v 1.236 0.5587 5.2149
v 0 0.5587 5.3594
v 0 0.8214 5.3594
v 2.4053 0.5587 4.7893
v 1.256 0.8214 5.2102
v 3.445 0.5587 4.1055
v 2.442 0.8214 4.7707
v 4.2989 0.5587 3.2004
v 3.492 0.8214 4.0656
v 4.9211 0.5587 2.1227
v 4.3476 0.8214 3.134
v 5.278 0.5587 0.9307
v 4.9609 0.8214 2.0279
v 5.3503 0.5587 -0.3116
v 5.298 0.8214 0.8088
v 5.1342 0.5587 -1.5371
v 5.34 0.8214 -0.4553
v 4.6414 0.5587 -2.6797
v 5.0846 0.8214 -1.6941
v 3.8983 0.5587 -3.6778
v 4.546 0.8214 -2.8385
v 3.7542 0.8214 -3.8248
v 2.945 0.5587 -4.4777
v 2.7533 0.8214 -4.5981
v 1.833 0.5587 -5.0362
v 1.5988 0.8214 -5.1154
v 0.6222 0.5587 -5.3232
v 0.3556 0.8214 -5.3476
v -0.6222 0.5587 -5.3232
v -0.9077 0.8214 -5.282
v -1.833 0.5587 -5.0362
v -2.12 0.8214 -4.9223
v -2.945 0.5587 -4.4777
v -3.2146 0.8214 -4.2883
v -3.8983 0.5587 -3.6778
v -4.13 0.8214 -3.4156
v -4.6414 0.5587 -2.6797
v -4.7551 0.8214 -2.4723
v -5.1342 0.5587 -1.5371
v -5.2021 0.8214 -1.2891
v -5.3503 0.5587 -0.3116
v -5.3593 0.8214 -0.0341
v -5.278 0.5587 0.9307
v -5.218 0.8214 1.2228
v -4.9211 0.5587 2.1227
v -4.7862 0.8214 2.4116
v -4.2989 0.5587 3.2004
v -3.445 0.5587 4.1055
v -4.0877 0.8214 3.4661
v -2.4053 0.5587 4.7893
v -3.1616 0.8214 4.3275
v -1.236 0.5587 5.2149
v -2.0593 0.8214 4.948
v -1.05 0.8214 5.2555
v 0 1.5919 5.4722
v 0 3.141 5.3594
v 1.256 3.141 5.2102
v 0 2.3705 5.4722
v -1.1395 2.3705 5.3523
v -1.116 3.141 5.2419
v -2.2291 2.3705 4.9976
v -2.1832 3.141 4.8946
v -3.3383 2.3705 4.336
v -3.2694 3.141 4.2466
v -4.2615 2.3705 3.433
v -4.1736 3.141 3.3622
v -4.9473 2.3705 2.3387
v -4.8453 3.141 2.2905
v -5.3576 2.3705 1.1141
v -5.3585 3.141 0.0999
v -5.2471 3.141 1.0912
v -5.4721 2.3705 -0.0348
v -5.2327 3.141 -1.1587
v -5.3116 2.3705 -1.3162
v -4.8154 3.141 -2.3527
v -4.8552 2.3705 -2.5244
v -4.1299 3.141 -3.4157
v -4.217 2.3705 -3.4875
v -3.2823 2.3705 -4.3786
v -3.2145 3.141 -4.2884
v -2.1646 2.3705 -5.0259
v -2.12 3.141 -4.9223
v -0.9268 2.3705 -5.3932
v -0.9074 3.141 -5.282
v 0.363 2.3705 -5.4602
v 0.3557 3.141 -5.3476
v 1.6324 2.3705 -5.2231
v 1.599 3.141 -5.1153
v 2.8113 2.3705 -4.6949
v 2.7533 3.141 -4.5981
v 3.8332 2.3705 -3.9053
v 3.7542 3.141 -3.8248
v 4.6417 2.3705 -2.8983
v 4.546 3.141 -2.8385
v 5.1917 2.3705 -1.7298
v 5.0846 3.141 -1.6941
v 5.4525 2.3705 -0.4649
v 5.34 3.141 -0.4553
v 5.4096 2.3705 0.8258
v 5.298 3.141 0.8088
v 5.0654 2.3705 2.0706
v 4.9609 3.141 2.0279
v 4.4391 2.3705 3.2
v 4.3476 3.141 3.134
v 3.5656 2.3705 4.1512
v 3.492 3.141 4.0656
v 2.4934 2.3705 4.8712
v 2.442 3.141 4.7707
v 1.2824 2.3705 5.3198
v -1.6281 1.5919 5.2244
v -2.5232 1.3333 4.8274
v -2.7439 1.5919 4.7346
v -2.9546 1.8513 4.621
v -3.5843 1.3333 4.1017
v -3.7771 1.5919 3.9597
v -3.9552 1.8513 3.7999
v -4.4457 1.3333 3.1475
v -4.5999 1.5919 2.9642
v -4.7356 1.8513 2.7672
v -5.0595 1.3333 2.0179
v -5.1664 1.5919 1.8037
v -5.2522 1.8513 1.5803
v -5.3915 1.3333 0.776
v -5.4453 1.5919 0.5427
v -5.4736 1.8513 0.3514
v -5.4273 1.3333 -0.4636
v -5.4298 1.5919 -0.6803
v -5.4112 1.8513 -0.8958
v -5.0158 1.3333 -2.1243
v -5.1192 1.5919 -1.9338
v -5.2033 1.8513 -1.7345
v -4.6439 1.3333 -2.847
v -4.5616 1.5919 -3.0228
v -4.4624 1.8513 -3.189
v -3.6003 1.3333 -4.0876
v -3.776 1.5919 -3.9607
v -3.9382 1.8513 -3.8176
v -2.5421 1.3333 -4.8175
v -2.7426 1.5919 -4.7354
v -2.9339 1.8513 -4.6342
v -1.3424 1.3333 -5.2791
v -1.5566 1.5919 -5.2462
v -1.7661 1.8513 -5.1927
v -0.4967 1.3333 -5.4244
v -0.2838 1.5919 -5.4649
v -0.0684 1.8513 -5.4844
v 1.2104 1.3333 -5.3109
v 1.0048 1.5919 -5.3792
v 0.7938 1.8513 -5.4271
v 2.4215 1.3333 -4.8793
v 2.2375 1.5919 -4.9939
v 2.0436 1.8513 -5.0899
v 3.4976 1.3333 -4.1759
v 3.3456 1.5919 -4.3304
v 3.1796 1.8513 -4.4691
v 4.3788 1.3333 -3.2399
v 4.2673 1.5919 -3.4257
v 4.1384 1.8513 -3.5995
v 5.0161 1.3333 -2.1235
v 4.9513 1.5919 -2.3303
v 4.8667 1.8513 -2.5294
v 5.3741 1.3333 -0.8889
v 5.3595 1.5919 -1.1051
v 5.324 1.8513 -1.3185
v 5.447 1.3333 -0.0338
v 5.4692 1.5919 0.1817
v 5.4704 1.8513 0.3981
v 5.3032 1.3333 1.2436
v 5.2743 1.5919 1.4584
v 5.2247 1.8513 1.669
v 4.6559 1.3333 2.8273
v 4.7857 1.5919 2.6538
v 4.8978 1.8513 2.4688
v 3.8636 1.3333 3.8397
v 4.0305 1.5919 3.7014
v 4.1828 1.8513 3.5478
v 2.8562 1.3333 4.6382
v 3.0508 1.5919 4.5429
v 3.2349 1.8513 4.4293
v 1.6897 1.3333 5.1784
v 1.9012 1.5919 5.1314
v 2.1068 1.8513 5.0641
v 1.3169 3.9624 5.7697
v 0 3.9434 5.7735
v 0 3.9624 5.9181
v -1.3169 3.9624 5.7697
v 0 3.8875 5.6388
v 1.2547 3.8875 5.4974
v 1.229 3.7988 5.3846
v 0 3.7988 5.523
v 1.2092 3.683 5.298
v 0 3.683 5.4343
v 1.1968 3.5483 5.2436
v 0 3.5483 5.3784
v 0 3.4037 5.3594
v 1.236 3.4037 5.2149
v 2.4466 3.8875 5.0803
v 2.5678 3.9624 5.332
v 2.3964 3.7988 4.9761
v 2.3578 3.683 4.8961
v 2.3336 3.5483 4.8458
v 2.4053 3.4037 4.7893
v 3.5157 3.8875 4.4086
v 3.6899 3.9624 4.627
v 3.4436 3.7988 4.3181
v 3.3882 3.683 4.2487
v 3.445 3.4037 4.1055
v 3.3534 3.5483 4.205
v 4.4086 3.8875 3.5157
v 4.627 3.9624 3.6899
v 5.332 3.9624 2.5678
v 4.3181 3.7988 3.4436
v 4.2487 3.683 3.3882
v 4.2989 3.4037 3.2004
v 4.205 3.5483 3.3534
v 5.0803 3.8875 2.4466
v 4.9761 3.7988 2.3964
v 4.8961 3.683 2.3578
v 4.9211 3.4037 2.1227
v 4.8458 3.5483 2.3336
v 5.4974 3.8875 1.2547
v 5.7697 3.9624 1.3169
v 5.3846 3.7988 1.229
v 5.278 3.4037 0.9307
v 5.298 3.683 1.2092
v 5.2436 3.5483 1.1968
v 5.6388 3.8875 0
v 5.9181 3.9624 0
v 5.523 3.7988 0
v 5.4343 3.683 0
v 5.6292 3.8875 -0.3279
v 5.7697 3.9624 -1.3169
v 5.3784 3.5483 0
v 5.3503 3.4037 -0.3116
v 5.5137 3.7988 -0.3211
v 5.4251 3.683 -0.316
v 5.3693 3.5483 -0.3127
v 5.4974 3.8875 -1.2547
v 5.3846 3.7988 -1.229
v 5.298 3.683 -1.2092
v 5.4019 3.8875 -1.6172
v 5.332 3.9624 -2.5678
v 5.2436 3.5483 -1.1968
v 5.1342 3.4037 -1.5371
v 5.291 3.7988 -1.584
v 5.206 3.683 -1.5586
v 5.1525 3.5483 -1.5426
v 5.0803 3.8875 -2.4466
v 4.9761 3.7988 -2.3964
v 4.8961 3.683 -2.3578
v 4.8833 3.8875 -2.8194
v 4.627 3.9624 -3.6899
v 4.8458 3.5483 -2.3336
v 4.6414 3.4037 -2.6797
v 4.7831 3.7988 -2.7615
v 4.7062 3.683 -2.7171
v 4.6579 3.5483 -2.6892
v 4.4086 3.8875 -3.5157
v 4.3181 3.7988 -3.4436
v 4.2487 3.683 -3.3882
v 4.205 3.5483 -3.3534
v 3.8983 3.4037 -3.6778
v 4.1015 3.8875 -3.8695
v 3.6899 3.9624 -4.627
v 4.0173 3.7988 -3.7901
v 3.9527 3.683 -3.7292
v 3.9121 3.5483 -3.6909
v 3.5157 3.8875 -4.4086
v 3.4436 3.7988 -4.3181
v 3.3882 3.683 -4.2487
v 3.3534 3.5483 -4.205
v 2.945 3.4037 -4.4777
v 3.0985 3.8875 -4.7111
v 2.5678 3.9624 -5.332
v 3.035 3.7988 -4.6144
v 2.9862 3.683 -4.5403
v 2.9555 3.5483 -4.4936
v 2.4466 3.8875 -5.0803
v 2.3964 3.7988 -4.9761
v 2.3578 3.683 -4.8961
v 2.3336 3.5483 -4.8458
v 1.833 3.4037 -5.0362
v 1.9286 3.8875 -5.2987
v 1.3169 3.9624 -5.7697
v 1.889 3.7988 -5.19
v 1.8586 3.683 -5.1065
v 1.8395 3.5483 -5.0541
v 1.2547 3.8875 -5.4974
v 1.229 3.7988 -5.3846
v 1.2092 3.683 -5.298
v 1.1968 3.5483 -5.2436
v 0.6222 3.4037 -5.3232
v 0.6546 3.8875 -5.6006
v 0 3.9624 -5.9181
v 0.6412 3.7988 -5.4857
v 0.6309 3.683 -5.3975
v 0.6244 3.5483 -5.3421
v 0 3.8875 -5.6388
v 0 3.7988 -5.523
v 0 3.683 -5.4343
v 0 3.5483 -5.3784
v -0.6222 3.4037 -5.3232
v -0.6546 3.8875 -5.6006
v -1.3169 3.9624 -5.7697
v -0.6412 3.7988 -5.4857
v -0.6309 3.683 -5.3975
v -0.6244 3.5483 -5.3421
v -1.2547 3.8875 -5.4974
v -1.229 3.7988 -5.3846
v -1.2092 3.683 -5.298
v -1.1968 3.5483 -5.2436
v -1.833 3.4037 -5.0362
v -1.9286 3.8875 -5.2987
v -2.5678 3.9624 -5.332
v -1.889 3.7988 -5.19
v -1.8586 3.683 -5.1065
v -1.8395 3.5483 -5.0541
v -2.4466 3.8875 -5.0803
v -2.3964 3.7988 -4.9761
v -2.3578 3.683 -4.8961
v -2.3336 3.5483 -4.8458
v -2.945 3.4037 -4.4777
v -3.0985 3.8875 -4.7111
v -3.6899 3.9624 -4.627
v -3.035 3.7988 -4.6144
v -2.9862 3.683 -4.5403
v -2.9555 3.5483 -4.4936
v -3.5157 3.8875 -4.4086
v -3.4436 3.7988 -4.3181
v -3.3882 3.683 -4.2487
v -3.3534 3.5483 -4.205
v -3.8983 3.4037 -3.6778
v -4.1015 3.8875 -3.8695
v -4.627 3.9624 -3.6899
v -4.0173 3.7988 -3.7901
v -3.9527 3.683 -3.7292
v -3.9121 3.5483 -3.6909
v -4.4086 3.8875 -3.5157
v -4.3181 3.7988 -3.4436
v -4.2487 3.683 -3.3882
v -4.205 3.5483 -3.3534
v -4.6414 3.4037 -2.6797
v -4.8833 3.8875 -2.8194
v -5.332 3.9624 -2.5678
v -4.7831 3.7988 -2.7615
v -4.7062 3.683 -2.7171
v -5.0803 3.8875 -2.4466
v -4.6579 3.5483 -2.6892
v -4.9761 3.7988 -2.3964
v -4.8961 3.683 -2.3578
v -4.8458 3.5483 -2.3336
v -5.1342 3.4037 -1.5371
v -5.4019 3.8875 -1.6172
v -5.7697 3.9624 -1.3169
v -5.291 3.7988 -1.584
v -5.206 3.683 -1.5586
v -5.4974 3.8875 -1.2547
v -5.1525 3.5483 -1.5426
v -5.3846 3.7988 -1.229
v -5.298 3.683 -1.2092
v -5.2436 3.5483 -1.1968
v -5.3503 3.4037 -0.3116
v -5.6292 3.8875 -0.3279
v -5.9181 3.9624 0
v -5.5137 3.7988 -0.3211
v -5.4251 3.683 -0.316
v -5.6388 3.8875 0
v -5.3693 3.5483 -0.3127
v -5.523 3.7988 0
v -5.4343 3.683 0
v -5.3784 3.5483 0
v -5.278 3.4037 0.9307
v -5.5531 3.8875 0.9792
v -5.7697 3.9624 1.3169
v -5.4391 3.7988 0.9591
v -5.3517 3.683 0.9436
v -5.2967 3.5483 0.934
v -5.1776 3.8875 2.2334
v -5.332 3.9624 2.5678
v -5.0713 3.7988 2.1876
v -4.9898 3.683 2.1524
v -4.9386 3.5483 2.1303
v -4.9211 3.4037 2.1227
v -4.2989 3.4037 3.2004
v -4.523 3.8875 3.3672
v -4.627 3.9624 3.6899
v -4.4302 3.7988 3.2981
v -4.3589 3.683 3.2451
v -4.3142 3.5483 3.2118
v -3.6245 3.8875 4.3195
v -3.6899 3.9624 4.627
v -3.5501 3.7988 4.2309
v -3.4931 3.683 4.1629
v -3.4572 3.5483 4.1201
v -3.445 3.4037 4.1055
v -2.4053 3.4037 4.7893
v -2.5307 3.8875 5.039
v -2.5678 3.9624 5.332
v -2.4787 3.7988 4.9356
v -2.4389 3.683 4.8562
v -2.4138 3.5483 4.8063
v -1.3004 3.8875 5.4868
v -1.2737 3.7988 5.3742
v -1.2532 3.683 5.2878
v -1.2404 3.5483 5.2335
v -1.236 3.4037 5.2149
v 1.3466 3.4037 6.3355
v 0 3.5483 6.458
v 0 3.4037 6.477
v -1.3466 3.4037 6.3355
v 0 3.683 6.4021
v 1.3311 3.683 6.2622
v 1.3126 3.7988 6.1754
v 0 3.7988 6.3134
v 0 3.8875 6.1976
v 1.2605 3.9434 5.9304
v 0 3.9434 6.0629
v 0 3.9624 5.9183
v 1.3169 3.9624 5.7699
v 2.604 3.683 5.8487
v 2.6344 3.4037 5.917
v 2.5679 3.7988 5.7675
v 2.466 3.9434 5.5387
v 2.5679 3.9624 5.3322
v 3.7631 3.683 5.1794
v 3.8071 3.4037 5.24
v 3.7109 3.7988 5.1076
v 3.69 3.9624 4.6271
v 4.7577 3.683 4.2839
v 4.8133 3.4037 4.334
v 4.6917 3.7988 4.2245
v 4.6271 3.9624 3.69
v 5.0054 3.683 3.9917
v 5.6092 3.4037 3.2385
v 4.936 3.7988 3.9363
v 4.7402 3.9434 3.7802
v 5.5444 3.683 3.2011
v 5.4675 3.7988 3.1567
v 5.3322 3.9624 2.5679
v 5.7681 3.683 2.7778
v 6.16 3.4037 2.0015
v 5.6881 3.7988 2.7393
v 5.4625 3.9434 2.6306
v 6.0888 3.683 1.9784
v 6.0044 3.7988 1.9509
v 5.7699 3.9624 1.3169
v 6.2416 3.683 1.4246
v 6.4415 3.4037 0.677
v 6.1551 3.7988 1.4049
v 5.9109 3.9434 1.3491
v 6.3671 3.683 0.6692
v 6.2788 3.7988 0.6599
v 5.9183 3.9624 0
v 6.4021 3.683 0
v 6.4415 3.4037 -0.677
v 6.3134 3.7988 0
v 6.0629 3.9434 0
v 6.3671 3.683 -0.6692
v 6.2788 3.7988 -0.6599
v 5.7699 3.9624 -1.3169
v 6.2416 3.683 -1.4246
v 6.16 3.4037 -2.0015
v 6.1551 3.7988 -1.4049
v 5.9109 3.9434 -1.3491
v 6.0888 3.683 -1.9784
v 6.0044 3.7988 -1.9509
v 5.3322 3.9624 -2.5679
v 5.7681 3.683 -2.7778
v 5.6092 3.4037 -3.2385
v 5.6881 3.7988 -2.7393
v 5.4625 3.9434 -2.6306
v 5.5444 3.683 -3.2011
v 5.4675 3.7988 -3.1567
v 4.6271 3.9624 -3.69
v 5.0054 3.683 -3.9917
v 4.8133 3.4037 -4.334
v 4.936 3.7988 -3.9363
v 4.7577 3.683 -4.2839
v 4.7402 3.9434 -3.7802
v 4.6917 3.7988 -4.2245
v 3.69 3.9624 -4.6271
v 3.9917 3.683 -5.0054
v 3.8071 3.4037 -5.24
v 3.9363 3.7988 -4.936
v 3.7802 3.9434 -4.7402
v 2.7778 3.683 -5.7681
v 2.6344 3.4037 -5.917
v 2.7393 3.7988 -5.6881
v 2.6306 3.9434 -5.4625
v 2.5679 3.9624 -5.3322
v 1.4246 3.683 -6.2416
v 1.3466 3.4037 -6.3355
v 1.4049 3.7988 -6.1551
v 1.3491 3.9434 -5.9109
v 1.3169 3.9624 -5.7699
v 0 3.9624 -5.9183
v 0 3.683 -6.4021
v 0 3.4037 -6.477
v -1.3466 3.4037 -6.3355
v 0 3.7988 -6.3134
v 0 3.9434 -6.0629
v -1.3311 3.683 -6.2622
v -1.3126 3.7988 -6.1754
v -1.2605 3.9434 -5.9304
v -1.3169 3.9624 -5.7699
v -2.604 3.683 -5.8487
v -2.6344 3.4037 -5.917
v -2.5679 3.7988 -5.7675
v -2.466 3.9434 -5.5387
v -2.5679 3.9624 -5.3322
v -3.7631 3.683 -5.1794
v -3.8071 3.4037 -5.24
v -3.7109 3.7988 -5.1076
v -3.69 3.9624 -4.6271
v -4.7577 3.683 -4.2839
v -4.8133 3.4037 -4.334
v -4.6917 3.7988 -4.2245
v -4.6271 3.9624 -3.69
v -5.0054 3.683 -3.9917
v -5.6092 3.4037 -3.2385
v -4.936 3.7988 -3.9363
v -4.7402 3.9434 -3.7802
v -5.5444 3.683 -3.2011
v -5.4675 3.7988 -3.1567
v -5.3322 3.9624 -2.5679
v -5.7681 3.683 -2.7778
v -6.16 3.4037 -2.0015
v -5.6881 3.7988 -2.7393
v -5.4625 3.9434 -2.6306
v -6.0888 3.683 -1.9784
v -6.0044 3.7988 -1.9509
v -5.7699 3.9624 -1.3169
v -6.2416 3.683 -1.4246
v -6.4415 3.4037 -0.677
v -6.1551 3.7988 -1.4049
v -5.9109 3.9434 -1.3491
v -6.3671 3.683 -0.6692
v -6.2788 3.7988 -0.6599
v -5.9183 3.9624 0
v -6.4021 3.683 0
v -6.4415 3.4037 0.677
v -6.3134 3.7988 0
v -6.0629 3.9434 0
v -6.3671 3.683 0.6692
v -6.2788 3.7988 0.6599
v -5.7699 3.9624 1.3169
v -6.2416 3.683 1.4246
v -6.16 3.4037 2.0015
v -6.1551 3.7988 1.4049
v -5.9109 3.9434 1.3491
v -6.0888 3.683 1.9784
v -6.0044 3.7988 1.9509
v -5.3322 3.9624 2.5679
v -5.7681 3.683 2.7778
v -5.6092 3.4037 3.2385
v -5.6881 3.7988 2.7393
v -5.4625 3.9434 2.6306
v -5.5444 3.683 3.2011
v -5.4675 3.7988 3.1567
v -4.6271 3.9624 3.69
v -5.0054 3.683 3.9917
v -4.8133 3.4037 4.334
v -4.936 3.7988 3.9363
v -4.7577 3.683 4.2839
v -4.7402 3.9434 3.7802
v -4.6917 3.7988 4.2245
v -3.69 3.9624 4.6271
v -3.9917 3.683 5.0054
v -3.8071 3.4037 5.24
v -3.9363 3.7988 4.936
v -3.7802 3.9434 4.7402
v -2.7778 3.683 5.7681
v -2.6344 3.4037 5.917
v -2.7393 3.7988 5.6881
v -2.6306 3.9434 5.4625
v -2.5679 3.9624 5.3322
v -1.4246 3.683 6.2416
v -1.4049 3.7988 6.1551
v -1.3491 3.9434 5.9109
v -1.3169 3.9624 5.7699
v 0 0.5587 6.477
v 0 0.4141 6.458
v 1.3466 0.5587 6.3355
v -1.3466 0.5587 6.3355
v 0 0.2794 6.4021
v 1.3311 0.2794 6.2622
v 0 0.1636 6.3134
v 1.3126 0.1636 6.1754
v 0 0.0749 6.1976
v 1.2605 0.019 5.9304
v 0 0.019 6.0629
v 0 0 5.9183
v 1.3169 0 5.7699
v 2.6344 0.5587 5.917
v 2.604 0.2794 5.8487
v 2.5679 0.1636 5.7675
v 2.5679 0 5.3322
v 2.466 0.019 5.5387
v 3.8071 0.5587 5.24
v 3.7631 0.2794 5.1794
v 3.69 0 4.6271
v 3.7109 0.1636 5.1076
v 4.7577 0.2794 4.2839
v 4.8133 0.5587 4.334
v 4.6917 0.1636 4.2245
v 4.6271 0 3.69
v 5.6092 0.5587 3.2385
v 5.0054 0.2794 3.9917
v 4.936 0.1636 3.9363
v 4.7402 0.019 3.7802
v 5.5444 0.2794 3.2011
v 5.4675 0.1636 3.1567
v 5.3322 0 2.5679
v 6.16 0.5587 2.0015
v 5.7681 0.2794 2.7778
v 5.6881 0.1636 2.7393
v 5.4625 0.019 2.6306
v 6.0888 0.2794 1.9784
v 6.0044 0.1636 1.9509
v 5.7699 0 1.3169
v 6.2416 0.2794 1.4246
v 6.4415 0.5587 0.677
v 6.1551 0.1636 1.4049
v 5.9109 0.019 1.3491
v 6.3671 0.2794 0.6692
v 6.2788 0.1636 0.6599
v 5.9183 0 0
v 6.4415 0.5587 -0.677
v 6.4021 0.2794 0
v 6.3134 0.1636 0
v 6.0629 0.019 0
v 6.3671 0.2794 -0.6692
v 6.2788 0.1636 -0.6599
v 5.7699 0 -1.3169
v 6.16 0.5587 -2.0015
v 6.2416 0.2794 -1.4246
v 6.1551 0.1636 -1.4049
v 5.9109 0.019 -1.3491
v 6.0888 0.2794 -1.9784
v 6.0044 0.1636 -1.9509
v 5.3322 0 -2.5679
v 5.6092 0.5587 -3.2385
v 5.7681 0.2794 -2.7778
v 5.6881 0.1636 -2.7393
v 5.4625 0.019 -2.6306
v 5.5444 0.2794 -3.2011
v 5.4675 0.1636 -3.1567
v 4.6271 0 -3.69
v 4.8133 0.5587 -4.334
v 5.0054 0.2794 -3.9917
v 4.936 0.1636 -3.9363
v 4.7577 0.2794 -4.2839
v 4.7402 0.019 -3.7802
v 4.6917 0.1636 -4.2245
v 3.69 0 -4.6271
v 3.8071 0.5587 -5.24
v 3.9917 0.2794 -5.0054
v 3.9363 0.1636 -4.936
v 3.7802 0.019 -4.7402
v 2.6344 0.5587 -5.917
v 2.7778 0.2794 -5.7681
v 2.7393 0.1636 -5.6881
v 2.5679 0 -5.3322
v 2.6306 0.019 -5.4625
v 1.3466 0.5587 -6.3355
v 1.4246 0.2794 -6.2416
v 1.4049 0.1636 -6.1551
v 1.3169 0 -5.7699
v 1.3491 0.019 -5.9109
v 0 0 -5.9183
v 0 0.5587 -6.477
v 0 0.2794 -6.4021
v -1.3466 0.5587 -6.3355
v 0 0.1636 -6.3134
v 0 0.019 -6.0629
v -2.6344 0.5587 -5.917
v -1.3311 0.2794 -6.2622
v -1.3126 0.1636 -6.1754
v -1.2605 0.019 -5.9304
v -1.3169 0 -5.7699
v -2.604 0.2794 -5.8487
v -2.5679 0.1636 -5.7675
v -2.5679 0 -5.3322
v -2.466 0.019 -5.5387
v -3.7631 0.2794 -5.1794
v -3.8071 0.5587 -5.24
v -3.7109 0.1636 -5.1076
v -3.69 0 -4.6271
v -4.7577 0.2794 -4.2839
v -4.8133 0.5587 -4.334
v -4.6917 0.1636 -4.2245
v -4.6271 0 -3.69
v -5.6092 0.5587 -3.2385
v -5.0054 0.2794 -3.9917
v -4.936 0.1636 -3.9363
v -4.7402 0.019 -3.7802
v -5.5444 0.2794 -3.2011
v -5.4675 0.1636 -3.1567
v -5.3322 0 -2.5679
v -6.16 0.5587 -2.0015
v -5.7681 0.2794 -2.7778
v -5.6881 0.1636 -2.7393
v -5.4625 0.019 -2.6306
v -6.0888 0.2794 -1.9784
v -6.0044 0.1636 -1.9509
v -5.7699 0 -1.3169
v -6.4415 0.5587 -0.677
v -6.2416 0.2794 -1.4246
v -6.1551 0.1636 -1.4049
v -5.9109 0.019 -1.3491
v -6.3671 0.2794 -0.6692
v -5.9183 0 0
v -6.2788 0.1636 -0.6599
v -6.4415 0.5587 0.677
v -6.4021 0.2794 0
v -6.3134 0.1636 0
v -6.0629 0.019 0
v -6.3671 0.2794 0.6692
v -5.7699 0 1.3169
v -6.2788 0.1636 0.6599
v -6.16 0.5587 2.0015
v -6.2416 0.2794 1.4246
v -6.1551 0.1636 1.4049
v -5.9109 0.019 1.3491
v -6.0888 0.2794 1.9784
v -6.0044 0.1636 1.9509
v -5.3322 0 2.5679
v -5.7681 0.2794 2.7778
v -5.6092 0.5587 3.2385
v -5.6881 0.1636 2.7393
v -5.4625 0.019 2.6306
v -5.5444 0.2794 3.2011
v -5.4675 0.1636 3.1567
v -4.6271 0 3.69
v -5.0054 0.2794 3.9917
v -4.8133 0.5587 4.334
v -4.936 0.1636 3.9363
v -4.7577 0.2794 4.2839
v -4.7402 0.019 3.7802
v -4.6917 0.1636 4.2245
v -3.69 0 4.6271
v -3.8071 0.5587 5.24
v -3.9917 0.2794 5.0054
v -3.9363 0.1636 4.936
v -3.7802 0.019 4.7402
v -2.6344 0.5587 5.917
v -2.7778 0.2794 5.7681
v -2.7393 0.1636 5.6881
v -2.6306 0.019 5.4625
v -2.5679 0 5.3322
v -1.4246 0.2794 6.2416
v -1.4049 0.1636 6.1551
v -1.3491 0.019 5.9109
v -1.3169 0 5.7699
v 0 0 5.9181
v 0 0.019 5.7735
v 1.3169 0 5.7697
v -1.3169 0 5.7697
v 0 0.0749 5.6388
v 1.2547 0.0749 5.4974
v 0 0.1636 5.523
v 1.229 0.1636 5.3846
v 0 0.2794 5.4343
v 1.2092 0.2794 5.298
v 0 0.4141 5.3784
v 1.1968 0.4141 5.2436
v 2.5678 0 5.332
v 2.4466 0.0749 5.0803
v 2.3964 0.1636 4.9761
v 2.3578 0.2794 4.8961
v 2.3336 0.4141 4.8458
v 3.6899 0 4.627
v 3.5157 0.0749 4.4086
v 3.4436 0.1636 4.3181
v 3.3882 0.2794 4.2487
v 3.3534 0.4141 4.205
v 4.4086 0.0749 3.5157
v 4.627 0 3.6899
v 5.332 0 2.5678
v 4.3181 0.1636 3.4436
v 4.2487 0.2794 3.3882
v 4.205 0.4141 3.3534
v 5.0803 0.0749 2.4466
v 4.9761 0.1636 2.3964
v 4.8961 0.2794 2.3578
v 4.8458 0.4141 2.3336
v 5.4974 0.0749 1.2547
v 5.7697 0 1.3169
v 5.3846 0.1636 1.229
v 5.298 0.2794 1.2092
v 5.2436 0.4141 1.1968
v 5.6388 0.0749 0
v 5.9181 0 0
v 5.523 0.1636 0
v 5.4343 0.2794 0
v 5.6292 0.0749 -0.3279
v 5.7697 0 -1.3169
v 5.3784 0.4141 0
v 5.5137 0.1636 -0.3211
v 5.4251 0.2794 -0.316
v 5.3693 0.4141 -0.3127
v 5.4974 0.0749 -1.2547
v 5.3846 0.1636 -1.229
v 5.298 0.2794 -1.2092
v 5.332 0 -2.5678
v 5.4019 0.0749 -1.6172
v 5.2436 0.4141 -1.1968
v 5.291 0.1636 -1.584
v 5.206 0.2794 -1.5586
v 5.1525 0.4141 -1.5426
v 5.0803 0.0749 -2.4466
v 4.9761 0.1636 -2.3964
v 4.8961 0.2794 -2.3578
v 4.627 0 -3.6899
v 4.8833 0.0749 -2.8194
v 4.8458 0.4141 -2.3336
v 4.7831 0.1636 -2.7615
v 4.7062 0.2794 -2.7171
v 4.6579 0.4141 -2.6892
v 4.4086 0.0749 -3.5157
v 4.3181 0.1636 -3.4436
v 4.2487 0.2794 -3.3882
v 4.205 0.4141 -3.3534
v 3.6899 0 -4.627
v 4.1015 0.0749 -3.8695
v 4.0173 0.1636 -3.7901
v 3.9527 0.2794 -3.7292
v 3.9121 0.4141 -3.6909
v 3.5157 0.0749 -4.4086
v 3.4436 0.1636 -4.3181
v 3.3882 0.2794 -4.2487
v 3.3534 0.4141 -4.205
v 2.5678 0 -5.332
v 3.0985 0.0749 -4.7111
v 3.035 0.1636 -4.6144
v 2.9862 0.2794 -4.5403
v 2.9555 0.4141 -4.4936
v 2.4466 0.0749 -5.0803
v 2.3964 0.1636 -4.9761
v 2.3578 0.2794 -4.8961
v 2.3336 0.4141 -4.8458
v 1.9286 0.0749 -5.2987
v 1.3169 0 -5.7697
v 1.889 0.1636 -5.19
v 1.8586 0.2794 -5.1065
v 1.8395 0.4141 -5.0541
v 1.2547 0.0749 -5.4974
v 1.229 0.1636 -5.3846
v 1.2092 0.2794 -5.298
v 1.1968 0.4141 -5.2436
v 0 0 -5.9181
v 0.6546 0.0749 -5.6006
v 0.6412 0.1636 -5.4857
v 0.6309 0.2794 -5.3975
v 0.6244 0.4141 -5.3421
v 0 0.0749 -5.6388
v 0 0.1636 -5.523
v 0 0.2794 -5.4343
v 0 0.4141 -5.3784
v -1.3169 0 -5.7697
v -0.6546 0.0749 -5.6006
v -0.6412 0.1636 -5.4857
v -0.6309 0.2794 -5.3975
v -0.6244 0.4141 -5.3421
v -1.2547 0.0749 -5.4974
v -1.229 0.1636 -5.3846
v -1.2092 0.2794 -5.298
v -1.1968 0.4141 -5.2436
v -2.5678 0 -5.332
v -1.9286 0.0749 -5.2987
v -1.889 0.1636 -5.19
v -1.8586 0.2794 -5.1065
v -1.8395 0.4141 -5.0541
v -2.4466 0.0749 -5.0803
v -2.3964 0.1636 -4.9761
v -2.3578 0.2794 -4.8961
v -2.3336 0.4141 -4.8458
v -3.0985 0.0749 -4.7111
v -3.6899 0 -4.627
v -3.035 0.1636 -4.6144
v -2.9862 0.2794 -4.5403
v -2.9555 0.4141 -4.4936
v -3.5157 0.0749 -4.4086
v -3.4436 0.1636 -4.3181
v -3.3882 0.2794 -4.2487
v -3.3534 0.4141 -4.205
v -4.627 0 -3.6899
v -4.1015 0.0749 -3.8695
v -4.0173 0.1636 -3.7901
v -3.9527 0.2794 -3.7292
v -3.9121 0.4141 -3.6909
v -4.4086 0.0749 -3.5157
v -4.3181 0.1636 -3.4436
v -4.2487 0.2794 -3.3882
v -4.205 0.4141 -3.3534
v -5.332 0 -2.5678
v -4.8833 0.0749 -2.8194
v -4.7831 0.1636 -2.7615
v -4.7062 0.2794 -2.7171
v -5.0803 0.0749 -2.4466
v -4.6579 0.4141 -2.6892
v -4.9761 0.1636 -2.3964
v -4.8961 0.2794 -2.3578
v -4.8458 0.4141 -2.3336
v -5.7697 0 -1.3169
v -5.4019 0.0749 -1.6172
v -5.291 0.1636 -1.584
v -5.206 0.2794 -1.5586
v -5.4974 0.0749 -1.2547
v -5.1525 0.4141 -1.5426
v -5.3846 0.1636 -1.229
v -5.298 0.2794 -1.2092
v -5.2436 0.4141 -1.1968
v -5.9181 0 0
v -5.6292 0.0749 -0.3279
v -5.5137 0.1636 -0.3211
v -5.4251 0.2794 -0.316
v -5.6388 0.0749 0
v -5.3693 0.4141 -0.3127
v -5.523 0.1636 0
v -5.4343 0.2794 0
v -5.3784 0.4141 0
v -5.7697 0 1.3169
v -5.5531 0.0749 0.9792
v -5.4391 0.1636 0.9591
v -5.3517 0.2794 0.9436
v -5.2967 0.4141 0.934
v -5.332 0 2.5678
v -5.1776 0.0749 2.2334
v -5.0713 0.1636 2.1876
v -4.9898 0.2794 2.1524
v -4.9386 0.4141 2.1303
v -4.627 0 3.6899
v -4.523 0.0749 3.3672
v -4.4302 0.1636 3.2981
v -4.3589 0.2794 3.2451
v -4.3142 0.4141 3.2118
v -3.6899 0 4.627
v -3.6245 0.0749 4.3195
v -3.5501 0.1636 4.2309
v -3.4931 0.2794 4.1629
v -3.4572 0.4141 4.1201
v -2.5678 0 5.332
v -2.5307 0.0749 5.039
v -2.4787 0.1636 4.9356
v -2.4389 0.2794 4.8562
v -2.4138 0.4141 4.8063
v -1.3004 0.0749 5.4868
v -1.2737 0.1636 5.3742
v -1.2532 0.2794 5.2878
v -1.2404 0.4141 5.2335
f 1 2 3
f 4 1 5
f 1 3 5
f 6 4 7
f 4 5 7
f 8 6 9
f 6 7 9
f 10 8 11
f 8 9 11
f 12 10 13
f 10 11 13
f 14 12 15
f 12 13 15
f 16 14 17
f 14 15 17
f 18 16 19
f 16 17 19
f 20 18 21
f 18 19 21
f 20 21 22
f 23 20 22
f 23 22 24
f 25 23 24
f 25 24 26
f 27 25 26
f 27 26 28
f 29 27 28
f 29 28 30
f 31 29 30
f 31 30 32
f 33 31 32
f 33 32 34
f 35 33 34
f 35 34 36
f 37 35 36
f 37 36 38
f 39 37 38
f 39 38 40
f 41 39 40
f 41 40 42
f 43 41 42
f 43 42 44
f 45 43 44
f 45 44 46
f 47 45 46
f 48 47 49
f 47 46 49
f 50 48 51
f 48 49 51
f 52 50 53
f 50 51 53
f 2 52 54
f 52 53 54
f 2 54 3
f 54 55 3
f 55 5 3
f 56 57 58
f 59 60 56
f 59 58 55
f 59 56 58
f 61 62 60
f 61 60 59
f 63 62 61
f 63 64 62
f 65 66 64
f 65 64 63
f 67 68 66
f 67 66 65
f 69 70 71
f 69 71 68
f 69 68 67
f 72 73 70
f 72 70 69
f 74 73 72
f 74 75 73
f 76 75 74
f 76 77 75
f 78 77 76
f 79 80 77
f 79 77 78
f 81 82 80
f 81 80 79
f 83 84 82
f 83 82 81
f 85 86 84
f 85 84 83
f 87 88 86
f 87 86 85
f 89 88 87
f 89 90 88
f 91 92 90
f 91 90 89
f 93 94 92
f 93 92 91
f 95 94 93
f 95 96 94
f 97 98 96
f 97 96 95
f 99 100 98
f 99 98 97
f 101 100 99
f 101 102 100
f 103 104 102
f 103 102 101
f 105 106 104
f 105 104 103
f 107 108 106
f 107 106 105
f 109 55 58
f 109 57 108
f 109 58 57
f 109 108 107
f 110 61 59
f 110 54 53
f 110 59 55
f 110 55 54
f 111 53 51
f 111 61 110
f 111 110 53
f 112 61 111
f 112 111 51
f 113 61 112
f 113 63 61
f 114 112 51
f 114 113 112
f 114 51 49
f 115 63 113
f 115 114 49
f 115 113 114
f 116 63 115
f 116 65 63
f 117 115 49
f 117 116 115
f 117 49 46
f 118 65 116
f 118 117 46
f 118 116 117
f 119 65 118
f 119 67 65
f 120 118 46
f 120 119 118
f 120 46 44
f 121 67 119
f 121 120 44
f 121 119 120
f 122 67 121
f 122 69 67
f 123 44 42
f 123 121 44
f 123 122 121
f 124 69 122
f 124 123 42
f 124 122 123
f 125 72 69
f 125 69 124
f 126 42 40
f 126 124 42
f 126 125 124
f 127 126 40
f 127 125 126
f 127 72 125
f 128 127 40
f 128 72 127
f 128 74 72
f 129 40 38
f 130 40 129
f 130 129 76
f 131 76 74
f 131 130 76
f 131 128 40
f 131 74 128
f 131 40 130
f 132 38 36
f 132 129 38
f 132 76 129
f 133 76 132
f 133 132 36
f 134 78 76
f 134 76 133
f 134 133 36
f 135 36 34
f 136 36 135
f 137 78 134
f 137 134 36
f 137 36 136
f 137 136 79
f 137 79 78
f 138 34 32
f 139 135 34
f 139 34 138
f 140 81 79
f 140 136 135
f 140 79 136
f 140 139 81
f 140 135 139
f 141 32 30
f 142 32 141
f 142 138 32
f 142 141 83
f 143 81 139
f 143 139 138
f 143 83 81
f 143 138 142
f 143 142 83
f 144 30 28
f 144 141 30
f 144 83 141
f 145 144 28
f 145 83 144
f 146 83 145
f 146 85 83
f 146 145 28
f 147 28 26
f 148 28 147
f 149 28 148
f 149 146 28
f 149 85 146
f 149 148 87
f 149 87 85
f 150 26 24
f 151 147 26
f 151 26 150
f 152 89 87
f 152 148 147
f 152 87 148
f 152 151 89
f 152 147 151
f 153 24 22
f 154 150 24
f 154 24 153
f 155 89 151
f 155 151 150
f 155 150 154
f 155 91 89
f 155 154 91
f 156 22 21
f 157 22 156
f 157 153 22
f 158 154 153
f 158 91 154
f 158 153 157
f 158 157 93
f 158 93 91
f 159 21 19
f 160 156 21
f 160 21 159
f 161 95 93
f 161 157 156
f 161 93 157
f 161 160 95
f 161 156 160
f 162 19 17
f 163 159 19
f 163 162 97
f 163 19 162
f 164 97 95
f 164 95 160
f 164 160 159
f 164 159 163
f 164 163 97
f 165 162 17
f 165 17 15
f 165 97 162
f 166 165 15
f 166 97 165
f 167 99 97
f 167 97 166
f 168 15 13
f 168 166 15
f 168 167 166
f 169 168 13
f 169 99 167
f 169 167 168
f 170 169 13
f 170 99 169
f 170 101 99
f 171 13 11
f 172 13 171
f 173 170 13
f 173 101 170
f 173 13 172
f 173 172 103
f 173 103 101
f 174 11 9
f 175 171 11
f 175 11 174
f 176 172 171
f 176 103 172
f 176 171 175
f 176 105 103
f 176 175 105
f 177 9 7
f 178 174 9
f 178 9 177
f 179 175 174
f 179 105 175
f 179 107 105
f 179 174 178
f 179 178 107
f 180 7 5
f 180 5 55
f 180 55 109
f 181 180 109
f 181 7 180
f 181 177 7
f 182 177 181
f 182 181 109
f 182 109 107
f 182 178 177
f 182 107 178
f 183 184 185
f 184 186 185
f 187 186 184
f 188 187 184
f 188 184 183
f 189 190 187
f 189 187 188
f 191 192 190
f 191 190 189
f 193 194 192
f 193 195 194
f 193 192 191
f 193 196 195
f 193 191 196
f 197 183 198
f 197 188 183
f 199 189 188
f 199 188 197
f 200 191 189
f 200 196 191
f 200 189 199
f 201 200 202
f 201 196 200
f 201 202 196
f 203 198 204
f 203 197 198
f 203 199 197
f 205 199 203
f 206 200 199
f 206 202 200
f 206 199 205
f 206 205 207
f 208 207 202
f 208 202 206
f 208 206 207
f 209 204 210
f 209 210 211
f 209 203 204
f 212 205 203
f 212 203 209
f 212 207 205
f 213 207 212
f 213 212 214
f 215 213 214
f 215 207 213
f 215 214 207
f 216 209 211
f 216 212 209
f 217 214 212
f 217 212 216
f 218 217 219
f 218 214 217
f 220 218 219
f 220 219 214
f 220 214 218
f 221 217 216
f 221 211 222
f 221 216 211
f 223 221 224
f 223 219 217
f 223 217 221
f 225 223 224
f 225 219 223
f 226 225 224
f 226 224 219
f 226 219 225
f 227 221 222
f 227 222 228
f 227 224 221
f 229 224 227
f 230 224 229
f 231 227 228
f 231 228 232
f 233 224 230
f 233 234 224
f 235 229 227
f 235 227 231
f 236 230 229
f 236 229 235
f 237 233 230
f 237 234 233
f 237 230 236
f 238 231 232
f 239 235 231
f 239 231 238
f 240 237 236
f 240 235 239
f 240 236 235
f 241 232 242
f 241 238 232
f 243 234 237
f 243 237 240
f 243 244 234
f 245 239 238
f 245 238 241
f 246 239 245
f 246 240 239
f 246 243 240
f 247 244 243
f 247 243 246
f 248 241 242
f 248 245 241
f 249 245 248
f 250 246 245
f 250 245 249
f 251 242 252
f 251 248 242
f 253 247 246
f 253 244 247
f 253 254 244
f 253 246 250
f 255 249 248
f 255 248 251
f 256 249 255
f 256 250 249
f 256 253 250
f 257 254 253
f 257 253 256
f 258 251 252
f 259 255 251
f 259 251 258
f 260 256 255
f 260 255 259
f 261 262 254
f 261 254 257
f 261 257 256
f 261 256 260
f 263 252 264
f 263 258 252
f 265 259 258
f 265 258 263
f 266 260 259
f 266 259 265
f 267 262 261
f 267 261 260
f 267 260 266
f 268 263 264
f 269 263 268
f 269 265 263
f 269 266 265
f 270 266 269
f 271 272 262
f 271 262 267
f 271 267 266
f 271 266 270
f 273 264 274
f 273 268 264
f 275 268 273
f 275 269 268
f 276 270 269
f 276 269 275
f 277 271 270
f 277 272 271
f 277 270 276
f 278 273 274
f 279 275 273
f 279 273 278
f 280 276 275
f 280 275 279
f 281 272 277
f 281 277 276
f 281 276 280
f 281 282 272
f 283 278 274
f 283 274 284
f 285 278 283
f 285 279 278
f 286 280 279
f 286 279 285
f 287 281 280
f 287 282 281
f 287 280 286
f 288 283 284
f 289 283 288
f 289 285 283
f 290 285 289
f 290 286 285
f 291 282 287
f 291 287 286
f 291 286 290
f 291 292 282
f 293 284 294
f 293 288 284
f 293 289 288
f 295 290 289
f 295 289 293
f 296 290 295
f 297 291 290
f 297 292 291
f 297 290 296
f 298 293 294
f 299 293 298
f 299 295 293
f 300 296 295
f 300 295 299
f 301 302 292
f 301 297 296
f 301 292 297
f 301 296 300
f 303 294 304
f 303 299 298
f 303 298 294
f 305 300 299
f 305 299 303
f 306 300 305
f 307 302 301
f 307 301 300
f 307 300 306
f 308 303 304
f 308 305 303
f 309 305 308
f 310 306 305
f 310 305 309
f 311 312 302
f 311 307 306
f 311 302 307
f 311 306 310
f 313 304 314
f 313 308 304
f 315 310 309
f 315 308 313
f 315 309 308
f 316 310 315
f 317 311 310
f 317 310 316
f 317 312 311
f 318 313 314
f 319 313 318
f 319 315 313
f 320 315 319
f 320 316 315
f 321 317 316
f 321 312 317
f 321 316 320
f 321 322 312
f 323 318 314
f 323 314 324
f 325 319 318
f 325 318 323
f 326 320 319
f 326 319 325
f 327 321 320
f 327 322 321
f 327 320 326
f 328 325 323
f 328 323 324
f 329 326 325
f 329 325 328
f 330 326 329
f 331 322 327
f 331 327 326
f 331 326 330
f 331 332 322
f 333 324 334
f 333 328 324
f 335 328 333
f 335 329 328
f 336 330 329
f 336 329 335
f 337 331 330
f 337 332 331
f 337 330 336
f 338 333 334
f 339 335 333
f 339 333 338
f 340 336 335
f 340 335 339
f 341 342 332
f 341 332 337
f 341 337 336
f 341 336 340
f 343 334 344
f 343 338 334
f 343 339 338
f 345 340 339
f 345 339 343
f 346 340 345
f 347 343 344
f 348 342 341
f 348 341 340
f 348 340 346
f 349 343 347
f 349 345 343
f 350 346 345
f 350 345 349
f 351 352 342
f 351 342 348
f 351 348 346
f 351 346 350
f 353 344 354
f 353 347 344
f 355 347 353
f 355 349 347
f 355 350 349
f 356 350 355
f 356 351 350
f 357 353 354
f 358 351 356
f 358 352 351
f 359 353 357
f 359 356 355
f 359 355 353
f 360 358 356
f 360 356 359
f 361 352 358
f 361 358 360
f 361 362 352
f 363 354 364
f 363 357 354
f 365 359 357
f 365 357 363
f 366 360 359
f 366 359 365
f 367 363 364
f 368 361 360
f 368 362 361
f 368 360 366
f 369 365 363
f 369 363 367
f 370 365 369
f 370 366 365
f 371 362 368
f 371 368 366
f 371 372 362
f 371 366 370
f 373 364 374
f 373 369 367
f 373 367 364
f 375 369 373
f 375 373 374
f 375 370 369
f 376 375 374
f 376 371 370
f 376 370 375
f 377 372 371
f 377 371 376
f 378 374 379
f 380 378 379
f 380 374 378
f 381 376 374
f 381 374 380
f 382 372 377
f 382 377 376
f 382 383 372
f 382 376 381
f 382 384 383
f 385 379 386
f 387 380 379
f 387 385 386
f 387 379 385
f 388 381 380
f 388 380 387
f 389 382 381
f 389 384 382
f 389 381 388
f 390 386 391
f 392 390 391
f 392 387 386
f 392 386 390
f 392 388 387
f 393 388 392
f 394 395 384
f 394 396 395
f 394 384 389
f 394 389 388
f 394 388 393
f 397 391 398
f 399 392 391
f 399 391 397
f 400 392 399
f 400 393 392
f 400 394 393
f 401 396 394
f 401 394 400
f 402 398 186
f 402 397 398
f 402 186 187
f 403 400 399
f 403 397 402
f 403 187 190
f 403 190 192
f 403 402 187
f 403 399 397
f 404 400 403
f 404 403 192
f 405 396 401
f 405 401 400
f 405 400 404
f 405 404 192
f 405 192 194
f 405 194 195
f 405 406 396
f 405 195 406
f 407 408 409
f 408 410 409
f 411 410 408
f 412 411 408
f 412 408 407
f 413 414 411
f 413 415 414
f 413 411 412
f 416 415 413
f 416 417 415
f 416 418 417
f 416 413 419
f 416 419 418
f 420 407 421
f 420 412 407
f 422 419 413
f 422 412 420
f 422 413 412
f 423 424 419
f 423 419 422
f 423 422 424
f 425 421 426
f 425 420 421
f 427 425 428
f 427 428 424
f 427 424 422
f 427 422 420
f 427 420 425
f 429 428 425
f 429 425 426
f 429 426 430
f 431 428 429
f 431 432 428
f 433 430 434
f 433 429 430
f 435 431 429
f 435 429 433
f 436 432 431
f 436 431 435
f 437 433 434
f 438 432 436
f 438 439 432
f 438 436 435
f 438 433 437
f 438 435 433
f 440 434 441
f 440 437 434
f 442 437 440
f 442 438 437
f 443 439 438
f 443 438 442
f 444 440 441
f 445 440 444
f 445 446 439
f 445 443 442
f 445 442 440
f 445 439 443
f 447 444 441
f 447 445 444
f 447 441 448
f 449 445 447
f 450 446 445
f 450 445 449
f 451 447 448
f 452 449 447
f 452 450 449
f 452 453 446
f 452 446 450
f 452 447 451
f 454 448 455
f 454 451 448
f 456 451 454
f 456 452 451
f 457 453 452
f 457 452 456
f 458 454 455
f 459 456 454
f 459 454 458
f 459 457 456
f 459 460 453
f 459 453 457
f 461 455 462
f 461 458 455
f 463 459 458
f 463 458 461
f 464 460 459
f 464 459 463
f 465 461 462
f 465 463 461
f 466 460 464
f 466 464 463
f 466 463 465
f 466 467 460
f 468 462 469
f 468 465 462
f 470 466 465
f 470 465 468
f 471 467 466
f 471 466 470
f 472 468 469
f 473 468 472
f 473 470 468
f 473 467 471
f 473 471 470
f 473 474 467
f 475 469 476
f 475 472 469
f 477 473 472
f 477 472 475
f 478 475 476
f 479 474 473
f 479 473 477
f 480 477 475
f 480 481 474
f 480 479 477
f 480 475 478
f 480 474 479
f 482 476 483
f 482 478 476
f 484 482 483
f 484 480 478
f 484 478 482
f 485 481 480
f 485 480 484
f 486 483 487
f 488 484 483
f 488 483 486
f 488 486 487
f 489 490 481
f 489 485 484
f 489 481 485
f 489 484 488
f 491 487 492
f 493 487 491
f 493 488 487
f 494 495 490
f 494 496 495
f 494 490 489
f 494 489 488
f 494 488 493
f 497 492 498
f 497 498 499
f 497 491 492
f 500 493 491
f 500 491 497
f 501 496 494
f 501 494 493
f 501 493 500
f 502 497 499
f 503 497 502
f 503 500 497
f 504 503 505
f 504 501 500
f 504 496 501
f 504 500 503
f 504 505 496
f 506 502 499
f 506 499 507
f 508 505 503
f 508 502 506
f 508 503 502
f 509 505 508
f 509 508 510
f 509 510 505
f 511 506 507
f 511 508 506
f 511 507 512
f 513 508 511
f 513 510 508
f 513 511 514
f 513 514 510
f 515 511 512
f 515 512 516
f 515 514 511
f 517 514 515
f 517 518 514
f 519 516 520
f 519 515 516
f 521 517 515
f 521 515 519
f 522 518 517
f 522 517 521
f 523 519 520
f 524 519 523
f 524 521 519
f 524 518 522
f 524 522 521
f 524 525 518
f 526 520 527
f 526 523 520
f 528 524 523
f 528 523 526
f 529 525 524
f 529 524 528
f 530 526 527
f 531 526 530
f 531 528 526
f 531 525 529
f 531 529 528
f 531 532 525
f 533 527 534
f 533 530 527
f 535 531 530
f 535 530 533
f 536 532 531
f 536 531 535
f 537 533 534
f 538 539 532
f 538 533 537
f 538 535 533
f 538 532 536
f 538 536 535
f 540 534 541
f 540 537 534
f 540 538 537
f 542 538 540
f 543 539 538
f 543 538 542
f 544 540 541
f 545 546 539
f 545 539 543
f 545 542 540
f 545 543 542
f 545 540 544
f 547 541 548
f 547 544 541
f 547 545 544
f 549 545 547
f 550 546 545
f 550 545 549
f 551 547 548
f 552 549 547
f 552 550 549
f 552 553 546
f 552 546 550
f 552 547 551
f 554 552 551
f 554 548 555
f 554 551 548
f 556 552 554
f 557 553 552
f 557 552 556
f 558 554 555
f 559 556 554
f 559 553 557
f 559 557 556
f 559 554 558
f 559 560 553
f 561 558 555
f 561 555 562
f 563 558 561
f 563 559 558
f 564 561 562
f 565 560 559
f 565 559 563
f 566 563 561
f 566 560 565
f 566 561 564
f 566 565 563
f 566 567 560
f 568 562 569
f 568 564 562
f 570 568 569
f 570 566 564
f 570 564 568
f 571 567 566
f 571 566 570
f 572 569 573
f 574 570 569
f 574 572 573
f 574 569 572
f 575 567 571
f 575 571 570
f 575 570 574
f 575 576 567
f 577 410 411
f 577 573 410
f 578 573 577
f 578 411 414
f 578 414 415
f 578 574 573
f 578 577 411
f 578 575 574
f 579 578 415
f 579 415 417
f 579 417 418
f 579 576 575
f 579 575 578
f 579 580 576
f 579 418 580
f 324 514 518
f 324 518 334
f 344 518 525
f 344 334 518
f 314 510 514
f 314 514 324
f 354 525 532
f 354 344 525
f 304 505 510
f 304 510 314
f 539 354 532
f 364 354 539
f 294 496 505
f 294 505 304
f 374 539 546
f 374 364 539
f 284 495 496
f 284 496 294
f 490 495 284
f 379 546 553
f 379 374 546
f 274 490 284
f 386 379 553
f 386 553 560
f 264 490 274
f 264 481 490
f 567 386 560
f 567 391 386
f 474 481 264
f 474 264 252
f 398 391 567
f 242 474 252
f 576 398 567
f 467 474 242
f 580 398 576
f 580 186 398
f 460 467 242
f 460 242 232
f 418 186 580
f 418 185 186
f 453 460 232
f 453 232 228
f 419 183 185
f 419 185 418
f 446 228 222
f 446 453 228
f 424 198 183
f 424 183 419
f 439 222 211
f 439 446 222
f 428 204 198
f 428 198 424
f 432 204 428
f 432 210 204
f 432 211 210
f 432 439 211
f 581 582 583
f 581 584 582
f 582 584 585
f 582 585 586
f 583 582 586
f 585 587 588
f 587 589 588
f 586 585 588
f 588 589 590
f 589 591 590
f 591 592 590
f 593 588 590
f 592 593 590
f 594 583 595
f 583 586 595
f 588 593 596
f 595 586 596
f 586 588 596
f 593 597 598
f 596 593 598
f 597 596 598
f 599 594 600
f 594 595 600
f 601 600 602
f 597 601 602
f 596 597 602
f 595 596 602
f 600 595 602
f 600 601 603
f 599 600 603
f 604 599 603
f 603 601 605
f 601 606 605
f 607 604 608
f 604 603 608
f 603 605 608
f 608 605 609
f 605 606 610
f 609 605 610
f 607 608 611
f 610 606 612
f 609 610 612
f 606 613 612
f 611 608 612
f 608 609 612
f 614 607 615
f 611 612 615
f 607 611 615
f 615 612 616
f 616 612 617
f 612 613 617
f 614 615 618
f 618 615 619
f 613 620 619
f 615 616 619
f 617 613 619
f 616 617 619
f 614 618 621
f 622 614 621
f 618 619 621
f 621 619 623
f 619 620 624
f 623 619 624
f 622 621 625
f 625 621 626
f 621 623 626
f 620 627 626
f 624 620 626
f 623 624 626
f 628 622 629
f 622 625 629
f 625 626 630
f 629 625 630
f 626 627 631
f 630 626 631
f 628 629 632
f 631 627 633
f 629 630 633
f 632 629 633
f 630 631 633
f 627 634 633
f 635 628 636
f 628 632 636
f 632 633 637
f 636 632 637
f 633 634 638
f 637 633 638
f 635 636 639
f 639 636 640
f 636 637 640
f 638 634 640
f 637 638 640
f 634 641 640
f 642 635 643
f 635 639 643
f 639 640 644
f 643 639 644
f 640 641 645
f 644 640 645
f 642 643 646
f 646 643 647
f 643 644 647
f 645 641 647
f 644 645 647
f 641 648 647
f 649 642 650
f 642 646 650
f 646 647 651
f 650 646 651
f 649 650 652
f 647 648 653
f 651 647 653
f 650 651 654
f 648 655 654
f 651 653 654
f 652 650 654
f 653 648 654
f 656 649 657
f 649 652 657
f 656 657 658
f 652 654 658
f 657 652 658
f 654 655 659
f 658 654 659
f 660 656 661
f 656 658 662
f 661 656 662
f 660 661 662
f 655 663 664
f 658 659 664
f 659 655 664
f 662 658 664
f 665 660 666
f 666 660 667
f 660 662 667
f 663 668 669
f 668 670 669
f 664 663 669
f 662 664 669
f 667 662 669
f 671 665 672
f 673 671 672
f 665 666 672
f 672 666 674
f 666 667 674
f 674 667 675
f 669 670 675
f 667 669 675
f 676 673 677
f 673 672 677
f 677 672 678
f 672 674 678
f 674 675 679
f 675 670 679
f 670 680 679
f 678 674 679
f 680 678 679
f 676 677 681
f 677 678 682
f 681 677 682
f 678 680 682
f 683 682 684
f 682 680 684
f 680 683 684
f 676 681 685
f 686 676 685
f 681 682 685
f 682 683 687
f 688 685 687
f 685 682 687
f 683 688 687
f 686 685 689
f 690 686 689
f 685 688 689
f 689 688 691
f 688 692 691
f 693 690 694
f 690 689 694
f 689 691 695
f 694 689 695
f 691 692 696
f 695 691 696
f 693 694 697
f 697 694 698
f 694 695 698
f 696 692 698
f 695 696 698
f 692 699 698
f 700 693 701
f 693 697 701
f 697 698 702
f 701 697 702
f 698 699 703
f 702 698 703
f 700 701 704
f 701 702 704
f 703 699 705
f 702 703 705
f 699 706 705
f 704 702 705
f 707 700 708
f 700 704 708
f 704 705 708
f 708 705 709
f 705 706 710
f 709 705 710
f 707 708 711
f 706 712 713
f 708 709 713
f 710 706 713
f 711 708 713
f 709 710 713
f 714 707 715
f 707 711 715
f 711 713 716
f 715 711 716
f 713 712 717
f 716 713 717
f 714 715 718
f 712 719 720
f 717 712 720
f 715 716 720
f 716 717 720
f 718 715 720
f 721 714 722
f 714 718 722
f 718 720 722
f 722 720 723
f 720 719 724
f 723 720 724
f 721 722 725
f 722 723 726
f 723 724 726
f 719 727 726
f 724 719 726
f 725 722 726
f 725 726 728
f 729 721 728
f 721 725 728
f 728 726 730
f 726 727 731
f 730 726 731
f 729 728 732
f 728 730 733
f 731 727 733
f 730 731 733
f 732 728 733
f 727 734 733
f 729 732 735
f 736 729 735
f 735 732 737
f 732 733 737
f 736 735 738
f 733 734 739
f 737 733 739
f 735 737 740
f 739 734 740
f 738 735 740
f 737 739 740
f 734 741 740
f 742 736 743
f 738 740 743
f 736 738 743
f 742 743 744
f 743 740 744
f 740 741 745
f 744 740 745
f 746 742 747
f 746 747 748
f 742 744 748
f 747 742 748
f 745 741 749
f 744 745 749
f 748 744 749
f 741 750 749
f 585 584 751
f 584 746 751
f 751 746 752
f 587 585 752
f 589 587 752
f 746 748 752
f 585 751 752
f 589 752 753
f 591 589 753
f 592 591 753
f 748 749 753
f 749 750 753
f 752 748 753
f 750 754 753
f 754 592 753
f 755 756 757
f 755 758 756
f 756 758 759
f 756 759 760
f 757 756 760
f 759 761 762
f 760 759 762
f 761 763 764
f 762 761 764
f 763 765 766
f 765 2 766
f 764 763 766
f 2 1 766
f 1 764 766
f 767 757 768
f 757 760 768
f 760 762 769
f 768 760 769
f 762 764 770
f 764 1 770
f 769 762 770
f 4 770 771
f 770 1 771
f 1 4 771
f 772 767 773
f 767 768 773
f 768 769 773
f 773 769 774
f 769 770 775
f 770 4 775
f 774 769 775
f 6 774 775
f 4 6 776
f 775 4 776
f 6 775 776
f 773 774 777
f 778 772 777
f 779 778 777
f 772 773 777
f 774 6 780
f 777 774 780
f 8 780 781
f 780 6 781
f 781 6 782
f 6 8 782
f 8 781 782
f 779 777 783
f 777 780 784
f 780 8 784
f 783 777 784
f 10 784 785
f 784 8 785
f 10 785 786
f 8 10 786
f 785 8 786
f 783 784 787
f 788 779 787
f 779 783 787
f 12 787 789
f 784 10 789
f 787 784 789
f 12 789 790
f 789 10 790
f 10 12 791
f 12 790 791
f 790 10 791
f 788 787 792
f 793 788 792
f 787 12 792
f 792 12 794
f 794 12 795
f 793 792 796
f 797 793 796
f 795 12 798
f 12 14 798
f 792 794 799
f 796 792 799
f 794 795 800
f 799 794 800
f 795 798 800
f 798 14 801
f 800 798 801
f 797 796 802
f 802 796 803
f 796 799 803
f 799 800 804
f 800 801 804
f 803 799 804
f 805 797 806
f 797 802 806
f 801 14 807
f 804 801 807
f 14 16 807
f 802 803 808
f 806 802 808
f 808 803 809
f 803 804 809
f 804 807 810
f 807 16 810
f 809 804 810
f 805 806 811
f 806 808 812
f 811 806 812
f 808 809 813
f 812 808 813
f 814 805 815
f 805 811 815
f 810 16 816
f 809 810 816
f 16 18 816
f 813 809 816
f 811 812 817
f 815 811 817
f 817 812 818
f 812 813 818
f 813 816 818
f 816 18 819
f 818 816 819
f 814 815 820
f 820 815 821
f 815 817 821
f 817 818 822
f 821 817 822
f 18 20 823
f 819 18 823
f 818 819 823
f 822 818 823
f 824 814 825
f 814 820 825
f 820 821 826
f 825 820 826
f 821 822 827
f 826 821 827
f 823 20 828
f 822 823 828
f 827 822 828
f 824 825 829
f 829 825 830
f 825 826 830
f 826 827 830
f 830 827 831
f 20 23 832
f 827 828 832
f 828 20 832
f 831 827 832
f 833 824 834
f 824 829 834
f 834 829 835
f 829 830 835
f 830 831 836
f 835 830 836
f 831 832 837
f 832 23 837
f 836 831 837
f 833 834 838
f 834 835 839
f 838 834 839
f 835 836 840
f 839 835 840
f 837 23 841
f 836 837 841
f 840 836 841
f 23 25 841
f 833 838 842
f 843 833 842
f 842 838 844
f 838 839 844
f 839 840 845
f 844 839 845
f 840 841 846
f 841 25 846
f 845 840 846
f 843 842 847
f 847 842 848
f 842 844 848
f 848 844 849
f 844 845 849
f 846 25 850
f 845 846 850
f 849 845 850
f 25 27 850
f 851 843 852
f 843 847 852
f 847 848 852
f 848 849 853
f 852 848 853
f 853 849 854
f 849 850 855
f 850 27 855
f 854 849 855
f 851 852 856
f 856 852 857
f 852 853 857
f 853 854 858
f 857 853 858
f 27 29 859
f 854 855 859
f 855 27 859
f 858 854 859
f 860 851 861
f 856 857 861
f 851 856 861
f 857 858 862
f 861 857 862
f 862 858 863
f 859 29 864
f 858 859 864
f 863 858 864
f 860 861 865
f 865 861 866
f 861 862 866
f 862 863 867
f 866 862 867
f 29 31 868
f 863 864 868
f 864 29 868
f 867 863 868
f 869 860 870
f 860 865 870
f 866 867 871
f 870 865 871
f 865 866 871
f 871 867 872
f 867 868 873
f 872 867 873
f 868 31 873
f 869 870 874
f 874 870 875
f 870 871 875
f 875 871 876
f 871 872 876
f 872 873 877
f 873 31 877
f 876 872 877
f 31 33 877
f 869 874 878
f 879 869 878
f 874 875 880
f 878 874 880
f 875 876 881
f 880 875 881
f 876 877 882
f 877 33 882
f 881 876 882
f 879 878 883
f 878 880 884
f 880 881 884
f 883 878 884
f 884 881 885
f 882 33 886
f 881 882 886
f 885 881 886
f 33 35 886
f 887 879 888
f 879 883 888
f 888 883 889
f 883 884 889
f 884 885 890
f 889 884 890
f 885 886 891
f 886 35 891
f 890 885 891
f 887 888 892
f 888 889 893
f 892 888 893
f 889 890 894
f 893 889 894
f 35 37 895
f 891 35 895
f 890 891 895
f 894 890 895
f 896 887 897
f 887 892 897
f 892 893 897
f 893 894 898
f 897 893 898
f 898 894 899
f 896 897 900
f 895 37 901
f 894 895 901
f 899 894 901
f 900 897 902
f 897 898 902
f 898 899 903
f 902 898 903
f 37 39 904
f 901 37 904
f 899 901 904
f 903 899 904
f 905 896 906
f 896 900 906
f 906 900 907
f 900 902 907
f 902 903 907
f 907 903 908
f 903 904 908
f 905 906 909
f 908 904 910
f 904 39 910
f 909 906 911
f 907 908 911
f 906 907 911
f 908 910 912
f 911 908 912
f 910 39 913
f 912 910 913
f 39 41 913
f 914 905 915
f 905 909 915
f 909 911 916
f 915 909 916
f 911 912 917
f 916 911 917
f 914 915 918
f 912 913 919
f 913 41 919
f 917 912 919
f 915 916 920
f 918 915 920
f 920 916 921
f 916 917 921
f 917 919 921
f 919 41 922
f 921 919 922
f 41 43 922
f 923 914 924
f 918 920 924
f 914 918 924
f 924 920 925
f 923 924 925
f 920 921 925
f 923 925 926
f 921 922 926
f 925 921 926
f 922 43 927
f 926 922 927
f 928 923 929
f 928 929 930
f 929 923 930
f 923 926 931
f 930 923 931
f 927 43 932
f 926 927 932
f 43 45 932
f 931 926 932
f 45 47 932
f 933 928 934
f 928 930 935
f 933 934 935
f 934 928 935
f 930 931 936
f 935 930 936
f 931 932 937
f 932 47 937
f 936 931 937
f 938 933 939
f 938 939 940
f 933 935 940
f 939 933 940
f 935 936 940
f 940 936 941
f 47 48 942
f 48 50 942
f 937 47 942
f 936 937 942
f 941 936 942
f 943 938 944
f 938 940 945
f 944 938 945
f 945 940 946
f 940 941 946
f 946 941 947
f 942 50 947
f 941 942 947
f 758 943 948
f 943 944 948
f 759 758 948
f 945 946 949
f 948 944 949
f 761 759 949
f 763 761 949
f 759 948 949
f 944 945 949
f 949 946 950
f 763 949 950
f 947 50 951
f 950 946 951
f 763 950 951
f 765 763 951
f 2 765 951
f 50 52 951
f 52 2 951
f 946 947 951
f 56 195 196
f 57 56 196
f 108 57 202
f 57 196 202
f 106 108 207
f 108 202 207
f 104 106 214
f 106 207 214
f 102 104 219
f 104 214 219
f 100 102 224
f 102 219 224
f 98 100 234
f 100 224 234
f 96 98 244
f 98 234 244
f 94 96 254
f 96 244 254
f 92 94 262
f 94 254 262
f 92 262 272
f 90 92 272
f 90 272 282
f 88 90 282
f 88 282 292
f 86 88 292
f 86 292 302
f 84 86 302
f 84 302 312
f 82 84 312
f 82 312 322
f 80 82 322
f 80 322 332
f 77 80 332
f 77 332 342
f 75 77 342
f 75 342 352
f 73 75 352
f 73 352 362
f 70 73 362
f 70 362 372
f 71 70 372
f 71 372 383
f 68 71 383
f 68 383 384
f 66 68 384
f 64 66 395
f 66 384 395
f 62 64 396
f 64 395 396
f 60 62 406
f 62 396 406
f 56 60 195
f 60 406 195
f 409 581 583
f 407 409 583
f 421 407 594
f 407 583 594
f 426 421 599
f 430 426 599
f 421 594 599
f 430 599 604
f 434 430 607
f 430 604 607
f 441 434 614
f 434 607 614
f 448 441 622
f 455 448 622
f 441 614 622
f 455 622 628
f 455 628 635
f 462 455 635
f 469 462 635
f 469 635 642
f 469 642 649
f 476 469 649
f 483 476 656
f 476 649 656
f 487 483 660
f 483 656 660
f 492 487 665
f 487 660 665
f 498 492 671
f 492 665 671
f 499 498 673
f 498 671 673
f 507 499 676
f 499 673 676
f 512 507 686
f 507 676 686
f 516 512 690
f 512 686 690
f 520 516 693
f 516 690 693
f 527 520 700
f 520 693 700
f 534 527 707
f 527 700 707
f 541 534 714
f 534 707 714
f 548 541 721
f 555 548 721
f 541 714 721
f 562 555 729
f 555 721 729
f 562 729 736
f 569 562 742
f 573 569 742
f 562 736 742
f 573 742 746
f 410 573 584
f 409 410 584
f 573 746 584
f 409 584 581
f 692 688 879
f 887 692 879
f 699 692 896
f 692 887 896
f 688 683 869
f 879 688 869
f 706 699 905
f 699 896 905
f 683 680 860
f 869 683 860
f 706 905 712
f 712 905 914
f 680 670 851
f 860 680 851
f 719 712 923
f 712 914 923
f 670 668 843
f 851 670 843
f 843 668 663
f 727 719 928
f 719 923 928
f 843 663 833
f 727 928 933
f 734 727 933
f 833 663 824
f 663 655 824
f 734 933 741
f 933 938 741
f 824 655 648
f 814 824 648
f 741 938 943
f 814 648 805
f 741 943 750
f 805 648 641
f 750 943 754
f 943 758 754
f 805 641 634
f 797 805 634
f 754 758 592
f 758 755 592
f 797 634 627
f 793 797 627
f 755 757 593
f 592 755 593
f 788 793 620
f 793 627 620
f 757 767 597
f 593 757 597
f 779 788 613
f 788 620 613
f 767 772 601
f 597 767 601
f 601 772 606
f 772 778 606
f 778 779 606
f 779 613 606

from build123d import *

# Parameters (mm, degrees)
SKETCH2_R           = 6.477
BOSS_EXTRUDE1_DEPTH = 3.9624
SKETCH3_R           = 5.3594
CUT_EXTRUDE1_DEPTH  = 3.9624
FILLET1_R           = 0.5588
FILLET2_R           = 0.5588


with BuildPart() as part:
    # Sketch2 → Boss-Extrude1 (new body)
    with BuildSketch(Plane(origin=(0, 0, 0), x_dir=(1, 0, 0), z_dir=(0, 1, 0))):
        with Locations(Location((0, 0, 0), (0, 0, 270))):
            Circle(SKETCH2_R)
    extrude(amount=BOSS_EXTRUDE1_DEPTH)

    # Sketch3 → Cut-Extrude1 (cut)
    with BuildSketch(Plane(origin=(0, 3.9624, 0), x_dir=(1, 0, 0), z_dir=(0, 1, 0))):
        with Locations(Location((0, 0, 0), (0, 0, 270))):
            Circle(SKETCH3_R)
    extrude(amount=-CUT_EXTRUDE1_DEPTH, mode=Mode.SUBTRACT)

    # Fillet1
    fillet1_edges = [part.edges().sort_by_distance(p)[0] for p in [
        (0, 3.9624, -6.477),
        (0, 3.9624, -5.3594),
    ]]
    fillet(fillet1_edges, radius=FILLET1_R - 0.0001)  # a hair under: the kernel refuses the full size

    # Fillet2
    fillet2_edges = [part.edges().sort_by_distance(p)[0] for p in [
        (0, 0, -6.477),
        (0, 0, -5.3594),
    ]]
    fillet(fillet2_edges, radius=FILLET2_R - 0.0001)  # a hair under: the kernel refuses the full size

    # Sketch5 → Cut-Revolve3 (revolve, cut)
    with BuildSketch(Plane.XY, mode=Mode.PRIVATE) as cut_revolve3_sk:
        with BuildLine():
            Line((-5.106760528, 3.9624), (-5.106760528, 0))
            ThreePointArc((-5.106760528, 0), (-5.4864, 1.9812), (-5.106760528, 3.9624))
        make_face()
    revolve(cut_revolve3_sk.sketch.rotate(Axis((0, 0, 0), (0, -1, 0)), 270), axis=Axis((0, 0, 0), (0, -1, 0)), mode=Mode.SUBTRACT)


solid = part.part
